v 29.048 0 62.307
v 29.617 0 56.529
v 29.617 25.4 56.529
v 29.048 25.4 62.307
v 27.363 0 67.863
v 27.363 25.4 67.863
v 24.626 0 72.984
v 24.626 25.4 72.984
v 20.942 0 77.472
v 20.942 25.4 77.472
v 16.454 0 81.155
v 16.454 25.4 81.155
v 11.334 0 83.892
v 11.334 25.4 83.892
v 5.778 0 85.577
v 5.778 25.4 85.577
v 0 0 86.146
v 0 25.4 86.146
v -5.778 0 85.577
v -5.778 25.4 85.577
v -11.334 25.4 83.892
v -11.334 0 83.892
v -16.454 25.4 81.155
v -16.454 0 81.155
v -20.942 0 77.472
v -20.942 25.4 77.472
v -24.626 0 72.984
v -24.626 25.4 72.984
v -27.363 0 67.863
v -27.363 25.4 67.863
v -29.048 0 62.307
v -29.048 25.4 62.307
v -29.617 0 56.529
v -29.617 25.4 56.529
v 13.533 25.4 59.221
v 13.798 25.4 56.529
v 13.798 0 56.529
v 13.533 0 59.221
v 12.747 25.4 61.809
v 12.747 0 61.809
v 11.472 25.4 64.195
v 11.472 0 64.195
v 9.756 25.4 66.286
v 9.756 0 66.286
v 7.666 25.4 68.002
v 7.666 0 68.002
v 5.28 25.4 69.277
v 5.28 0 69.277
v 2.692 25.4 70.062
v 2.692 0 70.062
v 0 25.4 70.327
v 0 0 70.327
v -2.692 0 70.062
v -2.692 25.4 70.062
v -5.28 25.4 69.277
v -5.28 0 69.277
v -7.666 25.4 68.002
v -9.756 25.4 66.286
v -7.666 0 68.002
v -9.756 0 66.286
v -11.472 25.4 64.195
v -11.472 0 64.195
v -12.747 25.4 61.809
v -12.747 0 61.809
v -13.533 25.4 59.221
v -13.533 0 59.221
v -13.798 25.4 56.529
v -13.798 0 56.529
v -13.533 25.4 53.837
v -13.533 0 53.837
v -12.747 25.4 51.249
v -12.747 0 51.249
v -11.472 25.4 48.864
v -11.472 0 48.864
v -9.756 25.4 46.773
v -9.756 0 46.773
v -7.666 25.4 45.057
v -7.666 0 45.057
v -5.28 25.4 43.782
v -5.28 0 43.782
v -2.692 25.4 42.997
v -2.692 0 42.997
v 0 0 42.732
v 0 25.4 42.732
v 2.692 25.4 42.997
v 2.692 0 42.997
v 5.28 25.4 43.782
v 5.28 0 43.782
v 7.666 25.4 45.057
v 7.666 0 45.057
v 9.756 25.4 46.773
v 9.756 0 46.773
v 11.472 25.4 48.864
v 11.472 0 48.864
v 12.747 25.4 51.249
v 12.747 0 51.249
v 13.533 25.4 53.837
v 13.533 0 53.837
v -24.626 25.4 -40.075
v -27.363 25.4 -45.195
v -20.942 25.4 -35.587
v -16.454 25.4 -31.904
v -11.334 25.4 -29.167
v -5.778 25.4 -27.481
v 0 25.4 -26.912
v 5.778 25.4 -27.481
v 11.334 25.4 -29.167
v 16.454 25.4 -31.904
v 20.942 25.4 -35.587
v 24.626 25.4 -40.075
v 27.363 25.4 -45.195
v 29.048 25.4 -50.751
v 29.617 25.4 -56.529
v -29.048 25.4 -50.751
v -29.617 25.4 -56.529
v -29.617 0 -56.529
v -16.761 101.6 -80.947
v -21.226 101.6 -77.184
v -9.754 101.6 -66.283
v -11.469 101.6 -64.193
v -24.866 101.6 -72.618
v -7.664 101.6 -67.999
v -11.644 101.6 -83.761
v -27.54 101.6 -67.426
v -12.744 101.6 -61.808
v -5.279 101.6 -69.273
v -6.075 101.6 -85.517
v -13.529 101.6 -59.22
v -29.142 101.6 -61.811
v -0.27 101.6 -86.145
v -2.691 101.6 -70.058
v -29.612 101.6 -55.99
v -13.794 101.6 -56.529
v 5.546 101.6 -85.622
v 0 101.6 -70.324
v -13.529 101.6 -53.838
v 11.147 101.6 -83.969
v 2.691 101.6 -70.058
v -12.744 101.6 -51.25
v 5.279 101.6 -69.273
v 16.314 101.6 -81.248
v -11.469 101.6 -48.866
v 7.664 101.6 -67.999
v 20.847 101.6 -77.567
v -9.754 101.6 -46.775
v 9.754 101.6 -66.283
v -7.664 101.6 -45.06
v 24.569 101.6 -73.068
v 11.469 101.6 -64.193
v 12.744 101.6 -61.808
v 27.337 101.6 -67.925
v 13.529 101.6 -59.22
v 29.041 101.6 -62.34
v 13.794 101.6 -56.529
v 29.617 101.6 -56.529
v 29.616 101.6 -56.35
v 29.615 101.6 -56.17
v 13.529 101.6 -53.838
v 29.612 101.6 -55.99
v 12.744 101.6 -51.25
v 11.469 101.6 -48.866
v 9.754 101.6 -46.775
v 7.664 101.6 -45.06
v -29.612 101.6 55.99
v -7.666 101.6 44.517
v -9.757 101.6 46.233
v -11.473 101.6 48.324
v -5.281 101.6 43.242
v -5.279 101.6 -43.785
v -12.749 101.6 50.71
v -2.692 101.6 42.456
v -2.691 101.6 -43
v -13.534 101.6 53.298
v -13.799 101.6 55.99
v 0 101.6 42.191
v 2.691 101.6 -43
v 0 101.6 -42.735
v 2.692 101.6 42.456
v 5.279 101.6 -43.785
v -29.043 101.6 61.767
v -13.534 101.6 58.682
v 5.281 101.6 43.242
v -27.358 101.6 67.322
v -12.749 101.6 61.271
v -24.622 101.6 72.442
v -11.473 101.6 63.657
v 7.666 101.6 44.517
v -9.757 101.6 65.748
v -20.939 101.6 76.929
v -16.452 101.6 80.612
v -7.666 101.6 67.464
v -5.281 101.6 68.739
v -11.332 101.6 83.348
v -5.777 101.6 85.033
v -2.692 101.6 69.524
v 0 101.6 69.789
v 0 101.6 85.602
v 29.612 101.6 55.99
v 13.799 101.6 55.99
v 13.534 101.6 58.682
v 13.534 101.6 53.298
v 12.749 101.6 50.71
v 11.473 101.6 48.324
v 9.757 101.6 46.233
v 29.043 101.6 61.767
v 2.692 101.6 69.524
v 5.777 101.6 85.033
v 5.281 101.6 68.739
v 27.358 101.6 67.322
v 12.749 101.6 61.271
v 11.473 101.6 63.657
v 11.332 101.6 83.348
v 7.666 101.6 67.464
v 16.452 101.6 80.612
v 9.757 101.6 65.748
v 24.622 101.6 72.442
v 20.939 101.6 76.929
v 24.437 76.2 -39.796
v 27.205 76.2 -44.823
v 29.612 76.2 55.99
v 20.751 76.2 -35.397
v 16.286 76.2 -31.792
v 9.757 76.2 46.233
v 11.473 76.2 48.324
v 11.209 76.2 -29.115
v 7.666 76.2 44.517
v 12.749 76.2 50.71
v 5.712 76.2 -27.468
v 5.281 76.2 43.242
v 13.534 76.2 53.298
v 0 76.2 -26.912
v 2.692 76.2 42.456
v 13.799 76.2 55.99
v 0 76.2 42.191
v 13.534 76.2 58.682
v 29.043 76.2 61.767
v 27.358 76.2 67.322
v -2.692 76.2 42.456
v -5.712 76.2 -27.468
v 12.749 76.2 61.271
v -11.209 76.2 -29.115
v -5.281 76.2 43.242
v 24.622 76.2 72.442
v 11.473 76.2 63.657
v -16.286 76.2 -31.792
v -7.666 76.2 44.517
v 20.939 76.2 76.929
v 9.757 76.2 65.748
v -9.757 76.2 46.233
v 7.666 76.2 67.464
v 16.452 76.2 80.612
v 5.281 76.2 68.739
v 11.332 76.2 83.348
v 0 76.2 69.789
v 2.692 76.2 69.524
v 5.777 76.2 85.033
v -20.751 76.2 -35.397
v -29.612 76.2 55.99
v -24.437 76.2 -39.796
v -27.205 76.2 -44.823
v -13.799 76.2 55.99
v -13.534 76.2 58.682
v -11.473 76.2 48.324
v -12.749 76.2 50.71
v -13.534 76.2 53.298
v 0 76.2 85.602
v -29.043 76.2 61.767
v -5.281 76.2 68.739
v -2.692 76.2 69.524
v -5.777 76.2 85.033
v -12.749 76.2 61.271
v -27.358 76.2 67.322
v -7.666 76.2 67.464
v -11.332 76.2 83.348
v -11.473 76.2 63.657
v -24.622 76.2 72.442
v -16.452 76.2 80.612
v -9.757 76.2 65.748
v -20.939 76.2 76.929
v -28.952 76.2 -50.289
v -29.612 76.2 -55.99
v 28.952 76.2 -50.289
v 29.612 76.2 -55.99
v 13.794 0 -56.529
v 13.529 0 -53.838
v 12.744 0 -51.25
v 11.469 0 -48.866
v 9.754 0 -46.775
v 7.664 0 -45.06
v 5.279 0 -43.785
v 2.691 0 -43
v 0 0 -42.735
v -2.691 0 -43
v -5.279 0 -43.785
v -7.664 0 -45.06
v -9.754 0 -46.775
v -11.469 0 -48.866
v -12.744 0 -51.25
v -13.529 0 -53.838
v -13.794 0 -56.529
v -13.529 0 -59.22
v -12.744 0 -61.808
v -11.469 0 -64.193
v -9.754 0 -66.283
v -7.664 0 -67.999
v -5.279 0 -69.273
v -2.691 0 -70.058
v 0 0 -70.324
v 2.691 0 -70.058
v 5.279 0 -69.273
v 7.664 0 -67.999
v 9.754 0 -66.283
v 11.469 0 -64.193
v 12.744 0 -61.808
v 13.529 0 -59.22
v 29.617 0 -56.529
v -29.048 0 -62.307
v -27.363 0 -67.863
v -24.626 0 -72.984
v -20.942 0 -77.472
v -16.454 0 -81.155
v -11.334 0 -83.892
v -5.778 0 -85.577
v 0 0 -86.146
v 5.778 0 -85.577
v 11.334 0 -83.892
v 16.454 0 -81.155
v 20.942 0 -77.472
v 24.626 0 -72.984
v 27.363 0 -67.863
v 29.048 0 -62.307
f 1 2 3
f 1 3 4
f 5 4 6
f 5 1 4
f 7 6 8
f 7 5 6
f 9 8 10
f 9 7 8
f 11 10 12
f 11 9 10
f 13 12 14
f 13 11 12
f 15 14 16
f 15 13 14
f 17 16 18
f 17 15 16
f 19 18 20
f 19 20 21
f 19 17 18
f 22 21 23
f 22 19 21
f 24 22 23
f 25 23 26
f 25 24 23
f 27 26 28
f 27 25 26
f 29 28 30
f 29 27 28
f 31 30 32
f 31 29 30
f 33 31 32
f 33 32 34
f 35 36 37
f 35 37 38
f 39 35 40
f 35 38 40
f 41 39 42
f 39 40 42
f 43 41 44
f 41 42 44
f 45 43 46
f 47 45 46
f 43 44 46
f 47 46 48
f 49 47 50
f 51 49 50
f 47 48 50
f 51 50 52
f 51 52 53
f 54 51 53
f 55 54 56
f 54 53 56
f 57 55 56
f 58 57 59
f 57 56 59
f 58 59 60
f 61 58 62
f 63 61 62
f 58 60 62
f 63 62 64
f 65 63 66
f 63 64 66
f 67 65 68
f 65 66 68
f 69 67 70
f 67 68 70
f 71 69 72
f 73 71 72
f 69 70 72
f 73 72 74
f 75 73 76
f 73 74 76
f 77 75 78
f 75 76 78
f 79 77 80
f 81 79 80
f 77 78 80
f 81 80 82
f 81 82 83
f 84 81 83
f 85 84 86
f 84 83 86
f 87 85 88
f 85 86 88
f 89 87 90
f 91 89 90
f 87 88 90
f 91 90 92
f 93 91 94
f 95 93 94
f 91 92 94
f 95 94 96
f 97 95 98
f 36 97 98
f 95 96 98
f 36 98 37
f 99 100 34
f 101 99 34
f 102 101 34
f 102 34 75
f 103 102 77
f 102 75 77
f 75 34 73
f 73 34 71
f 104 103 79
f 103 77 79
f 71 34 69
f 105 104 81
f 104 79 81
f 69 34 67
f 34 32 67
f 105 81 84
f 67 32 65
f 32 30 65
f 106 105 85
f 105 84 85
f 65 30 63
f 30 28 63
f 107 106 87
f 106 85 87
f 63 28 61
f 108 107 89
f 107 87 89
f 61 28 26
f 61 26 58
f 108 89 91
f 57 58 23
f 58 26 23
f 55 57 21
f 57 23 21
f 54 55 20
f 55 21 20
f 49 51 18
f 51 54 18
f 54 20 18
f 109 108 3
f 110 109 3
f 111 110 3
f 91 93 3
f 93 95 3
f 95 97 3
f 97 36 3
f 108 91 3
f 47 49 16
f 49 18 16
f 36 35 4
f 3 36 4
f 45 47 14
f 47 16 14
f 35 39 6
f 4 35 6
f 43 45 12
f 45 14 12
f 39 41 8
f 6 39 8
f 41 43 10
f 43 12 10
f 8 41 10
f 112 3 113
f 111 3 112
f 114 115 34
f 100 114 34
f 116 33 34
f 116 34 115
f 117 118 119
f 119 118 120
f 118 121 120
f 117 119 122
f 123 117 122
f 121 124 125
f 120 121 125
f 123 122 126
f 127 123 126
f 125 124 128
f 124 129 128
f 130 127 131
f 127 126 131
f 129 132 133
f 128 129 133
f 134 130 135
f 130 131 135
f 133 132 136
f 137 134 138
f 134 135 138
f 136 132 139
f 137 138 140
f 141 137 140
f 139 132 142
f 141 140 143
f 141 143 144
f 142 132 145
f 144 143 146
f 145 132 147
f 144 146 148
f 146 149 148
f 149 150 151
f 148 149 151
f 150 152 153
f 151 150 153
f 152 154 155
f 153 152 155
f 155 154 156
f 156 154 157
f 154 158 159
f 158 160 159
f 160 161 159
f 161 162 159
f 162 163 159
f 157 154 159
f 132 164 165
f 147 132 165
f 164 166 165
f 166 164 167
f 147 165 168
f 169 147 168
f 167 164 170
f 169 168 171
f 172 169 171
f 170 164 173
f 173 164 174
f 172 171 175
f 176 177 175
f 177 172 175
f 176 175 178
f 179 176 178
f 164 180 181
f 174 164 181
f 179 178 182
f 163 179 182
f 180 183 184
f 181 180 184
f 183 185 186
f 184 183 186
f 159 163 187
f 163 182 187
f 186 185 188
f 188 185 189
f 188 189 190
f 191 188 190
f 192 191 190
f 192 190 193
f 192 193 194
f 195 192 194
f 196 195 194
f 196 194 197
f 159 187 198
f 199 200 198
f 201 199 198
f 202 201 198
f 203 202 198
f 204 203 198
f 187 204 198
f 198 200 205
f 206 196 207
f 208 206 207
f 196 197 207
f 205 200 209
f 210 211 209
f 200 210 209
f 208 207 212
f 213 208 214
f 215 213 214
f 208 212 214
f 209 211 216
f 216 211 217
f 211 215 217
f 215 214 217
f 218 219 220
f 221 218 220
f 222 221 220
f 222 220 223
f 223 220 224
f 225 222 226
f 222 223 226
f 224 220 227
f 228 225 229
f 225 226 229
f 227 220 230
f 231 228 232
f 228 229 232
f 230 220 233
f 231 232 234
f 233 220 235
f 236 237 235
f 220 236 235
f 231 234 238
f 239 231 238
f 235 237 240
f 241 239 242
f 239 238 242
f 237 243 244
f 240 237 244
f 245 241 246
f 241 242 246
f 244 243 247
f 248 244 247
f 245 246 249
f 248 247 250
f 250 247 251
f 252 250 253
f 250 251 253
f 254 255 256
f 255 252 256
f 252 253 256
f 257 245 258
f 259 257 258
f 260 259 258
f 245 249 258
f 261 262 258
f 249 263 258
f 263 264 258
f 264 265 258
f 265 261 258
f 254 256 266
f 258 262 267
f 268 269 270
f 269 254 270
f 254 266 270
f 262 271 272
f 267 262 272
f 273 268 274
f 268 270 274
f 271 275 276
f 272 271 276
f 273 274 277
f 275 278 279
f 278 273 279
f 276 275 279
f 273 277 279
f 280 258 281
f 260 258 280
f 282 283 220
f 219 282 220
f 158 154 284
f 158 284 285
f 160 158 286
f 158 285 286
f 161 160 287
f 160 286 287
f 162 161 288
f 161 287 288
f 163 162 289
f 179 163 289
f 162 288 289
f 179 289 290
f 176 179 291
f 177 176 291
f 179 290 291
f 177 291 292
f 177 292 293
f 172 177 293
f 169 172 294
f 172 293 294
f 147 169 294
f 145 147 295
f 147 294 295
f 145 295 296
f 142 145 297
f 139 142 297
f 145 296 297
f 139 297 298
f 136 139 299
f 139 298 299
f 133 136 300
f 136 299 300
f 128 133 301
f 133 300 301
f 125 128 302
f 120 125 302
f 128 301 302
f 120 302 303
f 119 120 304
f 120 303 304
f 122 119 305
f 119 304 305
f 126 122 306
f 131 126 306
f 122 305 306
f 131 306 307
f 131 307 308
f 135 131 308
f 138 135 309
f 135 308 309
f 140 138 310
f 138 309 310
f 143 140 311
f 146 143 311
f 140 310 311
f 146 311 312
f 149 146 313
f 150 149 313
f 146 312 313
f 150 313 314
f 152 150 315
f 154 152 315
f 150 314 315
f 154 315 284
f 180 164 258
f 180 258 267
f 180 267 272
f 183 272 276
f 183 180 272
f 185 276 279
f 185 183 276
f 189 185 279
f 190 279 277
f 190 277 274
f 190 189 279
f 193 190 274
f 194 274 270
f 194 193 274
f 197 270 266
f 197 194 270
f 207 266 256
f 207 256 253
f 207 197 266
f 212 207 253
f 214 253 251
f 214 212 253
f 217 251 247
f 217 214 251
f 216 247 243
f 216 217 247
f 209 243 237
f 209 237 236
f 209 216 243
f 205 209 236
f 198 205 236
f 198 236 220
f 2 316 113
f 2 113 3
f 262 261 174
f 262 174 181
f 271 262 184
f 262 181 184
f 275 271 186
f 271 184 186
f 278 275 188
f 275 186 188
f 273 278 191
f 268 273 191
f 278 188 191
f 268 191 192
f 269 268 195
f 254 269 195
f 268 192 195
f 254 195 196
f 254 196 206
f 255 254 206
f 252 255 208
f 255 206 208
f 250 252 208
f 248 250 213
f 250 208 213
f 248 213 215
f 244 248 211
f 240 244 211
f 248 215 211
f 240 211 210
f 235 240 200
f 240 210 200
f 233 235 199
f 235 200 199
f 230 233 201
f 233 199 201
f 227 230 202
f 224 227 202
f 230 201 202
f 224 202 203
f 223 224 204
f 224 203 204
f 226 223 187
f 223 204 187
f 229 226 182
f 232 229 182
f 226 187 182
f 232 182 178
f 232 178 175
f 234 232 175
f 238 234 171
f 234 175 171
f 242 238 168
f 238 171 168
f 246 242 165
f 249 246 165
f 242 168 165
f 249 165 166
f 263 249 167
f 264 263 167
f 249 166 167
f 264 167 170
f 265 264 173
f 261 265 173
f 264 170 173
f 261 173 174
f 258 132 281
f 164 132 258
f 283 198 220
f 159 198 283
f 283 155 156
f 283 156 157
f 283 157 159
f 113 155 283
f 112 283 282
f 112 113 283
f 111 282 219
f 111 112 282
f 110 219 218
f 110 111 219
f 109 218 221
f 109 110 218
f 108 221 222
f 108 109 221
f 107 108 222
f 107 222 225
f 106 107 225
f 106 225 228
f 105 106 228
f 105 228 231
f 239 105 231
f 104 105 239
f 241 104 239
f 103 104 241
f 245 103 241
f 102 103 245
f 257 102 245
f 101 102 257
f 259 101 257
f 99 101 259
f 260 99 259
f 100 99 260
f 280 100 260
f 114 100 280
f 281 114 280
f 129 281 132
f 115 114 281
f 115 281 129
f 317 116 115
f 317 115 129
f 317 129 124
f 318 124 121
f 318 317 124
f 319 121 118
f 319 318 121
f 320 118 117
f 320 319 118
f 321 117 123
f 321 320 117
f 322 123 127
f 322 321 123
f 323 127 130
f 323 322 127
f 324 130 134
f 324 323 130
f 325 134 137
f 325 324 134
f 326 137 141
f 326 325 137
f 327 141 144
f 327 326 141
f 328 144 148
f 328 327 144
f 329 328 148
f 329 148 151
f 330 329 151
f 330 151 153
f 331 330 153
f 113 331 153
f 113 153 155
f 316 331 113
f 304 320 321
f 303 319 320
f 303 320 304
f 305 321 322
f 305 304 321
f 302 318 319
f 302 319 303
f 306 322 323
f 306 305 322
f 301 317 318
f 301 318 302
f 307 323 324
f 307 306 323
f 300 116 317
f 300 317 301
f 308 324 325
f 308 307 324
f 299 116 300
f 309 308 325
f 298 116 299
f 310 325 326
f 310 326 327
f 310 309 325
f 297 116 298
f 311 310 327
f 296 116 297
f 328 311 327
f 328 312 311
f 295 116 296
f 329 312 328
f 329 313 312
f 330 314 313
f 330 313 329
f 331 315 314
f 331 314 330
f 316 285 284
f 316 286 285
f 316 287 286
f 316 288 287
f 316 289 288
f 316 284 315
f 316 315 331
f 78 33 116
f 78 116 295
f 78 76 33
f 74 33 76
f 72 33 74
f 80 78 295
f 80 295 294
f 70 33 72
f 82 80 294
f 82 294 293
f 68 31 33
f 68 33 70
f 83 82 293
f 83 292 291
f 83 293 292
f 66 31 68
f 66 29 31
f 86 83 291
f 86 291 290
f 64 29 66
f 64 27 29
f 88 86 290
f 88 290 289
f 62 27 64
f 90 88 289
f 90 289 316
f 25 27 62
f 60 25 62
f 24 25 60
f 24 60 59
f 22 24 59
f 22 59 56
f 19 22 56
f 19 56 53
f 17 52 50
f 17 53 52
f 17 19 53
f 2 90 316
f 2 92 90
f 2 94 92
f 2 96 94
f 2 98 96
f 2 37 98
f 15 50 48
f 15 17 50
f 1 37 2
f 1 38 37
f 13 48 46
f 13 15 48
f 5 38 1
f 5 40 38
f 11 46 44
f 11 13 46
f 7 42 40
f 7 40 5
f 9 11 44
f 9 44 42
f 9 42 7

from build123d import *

# Parameters (mm, degrees)
F0_R     = 13.797693
F1_DEPTH = 25.4
F2_R     = 29.61701
F2_R_2   = 13.794222
F3_DEPTH = 101.6
F4_R     = 13.798954
F5_DEPTH = 25.4


with BuildPart() as f1:
    # F0 (on Front) → F1 (new body)
    with BuildSketch(Plane.XZ):
        with BuildLine():
            ThreePointArc((-29.61701, -56.529284), (0, -26.912274), (29.61701, -56.529284))
            Line((29.61701, -56.529284), (29.61701, 56.529284))
            ThreePointArc((29.61701, 56.529284), (0, 86.146293), (-29.61701, 56.529284))
            Line((-29.61701, 56.529284), (-29.61701, -56.529284))
        make_face()
        with Locations((0, 56.529284)):
            Circle(F0_R, mode=Mode.SUBTRACT)
    extrude(amount=-F1_DEPTH)

    # F2 (on face) → F3 (join)
    with BuildSketch(Plane.XZ):
        with Locations((0, -56.529284)):
            Circle(F2_R)
        with Locations((0, -56.529284)):
            Circle(F2_R_2, mode=Mode.SUBTRACT)
    extrude(amount=-F3_DEPTH)

    # F4 (on face) → F5 (join)
    with BuildSketch(Plane(origin=(0, 101.6, 0), x_dir=(-1, 0, 0), z_dir=(0, 1, 0))):
        with BuildLine():
            ThreePointArc((-29.612104, -55.99023), (0, -26.912274), (29.612104, -55.99023))
            Line((29.612104, -55.99023), (29.612104, 55.99023))
            ThreePointArc((29.612104, 55.99023), (0, 85.602334), (-29.612104, 55.99023))
            Line((-29.612104, 55.99023), (-29.612104, -55.99023))
        make_face()
        with Locations((0, 55.99023)):
            Circle(F4_R, mode=Mode.SUBTRACT)
    extrude(amount=-F5_DEPTH)


solid = f1.part
